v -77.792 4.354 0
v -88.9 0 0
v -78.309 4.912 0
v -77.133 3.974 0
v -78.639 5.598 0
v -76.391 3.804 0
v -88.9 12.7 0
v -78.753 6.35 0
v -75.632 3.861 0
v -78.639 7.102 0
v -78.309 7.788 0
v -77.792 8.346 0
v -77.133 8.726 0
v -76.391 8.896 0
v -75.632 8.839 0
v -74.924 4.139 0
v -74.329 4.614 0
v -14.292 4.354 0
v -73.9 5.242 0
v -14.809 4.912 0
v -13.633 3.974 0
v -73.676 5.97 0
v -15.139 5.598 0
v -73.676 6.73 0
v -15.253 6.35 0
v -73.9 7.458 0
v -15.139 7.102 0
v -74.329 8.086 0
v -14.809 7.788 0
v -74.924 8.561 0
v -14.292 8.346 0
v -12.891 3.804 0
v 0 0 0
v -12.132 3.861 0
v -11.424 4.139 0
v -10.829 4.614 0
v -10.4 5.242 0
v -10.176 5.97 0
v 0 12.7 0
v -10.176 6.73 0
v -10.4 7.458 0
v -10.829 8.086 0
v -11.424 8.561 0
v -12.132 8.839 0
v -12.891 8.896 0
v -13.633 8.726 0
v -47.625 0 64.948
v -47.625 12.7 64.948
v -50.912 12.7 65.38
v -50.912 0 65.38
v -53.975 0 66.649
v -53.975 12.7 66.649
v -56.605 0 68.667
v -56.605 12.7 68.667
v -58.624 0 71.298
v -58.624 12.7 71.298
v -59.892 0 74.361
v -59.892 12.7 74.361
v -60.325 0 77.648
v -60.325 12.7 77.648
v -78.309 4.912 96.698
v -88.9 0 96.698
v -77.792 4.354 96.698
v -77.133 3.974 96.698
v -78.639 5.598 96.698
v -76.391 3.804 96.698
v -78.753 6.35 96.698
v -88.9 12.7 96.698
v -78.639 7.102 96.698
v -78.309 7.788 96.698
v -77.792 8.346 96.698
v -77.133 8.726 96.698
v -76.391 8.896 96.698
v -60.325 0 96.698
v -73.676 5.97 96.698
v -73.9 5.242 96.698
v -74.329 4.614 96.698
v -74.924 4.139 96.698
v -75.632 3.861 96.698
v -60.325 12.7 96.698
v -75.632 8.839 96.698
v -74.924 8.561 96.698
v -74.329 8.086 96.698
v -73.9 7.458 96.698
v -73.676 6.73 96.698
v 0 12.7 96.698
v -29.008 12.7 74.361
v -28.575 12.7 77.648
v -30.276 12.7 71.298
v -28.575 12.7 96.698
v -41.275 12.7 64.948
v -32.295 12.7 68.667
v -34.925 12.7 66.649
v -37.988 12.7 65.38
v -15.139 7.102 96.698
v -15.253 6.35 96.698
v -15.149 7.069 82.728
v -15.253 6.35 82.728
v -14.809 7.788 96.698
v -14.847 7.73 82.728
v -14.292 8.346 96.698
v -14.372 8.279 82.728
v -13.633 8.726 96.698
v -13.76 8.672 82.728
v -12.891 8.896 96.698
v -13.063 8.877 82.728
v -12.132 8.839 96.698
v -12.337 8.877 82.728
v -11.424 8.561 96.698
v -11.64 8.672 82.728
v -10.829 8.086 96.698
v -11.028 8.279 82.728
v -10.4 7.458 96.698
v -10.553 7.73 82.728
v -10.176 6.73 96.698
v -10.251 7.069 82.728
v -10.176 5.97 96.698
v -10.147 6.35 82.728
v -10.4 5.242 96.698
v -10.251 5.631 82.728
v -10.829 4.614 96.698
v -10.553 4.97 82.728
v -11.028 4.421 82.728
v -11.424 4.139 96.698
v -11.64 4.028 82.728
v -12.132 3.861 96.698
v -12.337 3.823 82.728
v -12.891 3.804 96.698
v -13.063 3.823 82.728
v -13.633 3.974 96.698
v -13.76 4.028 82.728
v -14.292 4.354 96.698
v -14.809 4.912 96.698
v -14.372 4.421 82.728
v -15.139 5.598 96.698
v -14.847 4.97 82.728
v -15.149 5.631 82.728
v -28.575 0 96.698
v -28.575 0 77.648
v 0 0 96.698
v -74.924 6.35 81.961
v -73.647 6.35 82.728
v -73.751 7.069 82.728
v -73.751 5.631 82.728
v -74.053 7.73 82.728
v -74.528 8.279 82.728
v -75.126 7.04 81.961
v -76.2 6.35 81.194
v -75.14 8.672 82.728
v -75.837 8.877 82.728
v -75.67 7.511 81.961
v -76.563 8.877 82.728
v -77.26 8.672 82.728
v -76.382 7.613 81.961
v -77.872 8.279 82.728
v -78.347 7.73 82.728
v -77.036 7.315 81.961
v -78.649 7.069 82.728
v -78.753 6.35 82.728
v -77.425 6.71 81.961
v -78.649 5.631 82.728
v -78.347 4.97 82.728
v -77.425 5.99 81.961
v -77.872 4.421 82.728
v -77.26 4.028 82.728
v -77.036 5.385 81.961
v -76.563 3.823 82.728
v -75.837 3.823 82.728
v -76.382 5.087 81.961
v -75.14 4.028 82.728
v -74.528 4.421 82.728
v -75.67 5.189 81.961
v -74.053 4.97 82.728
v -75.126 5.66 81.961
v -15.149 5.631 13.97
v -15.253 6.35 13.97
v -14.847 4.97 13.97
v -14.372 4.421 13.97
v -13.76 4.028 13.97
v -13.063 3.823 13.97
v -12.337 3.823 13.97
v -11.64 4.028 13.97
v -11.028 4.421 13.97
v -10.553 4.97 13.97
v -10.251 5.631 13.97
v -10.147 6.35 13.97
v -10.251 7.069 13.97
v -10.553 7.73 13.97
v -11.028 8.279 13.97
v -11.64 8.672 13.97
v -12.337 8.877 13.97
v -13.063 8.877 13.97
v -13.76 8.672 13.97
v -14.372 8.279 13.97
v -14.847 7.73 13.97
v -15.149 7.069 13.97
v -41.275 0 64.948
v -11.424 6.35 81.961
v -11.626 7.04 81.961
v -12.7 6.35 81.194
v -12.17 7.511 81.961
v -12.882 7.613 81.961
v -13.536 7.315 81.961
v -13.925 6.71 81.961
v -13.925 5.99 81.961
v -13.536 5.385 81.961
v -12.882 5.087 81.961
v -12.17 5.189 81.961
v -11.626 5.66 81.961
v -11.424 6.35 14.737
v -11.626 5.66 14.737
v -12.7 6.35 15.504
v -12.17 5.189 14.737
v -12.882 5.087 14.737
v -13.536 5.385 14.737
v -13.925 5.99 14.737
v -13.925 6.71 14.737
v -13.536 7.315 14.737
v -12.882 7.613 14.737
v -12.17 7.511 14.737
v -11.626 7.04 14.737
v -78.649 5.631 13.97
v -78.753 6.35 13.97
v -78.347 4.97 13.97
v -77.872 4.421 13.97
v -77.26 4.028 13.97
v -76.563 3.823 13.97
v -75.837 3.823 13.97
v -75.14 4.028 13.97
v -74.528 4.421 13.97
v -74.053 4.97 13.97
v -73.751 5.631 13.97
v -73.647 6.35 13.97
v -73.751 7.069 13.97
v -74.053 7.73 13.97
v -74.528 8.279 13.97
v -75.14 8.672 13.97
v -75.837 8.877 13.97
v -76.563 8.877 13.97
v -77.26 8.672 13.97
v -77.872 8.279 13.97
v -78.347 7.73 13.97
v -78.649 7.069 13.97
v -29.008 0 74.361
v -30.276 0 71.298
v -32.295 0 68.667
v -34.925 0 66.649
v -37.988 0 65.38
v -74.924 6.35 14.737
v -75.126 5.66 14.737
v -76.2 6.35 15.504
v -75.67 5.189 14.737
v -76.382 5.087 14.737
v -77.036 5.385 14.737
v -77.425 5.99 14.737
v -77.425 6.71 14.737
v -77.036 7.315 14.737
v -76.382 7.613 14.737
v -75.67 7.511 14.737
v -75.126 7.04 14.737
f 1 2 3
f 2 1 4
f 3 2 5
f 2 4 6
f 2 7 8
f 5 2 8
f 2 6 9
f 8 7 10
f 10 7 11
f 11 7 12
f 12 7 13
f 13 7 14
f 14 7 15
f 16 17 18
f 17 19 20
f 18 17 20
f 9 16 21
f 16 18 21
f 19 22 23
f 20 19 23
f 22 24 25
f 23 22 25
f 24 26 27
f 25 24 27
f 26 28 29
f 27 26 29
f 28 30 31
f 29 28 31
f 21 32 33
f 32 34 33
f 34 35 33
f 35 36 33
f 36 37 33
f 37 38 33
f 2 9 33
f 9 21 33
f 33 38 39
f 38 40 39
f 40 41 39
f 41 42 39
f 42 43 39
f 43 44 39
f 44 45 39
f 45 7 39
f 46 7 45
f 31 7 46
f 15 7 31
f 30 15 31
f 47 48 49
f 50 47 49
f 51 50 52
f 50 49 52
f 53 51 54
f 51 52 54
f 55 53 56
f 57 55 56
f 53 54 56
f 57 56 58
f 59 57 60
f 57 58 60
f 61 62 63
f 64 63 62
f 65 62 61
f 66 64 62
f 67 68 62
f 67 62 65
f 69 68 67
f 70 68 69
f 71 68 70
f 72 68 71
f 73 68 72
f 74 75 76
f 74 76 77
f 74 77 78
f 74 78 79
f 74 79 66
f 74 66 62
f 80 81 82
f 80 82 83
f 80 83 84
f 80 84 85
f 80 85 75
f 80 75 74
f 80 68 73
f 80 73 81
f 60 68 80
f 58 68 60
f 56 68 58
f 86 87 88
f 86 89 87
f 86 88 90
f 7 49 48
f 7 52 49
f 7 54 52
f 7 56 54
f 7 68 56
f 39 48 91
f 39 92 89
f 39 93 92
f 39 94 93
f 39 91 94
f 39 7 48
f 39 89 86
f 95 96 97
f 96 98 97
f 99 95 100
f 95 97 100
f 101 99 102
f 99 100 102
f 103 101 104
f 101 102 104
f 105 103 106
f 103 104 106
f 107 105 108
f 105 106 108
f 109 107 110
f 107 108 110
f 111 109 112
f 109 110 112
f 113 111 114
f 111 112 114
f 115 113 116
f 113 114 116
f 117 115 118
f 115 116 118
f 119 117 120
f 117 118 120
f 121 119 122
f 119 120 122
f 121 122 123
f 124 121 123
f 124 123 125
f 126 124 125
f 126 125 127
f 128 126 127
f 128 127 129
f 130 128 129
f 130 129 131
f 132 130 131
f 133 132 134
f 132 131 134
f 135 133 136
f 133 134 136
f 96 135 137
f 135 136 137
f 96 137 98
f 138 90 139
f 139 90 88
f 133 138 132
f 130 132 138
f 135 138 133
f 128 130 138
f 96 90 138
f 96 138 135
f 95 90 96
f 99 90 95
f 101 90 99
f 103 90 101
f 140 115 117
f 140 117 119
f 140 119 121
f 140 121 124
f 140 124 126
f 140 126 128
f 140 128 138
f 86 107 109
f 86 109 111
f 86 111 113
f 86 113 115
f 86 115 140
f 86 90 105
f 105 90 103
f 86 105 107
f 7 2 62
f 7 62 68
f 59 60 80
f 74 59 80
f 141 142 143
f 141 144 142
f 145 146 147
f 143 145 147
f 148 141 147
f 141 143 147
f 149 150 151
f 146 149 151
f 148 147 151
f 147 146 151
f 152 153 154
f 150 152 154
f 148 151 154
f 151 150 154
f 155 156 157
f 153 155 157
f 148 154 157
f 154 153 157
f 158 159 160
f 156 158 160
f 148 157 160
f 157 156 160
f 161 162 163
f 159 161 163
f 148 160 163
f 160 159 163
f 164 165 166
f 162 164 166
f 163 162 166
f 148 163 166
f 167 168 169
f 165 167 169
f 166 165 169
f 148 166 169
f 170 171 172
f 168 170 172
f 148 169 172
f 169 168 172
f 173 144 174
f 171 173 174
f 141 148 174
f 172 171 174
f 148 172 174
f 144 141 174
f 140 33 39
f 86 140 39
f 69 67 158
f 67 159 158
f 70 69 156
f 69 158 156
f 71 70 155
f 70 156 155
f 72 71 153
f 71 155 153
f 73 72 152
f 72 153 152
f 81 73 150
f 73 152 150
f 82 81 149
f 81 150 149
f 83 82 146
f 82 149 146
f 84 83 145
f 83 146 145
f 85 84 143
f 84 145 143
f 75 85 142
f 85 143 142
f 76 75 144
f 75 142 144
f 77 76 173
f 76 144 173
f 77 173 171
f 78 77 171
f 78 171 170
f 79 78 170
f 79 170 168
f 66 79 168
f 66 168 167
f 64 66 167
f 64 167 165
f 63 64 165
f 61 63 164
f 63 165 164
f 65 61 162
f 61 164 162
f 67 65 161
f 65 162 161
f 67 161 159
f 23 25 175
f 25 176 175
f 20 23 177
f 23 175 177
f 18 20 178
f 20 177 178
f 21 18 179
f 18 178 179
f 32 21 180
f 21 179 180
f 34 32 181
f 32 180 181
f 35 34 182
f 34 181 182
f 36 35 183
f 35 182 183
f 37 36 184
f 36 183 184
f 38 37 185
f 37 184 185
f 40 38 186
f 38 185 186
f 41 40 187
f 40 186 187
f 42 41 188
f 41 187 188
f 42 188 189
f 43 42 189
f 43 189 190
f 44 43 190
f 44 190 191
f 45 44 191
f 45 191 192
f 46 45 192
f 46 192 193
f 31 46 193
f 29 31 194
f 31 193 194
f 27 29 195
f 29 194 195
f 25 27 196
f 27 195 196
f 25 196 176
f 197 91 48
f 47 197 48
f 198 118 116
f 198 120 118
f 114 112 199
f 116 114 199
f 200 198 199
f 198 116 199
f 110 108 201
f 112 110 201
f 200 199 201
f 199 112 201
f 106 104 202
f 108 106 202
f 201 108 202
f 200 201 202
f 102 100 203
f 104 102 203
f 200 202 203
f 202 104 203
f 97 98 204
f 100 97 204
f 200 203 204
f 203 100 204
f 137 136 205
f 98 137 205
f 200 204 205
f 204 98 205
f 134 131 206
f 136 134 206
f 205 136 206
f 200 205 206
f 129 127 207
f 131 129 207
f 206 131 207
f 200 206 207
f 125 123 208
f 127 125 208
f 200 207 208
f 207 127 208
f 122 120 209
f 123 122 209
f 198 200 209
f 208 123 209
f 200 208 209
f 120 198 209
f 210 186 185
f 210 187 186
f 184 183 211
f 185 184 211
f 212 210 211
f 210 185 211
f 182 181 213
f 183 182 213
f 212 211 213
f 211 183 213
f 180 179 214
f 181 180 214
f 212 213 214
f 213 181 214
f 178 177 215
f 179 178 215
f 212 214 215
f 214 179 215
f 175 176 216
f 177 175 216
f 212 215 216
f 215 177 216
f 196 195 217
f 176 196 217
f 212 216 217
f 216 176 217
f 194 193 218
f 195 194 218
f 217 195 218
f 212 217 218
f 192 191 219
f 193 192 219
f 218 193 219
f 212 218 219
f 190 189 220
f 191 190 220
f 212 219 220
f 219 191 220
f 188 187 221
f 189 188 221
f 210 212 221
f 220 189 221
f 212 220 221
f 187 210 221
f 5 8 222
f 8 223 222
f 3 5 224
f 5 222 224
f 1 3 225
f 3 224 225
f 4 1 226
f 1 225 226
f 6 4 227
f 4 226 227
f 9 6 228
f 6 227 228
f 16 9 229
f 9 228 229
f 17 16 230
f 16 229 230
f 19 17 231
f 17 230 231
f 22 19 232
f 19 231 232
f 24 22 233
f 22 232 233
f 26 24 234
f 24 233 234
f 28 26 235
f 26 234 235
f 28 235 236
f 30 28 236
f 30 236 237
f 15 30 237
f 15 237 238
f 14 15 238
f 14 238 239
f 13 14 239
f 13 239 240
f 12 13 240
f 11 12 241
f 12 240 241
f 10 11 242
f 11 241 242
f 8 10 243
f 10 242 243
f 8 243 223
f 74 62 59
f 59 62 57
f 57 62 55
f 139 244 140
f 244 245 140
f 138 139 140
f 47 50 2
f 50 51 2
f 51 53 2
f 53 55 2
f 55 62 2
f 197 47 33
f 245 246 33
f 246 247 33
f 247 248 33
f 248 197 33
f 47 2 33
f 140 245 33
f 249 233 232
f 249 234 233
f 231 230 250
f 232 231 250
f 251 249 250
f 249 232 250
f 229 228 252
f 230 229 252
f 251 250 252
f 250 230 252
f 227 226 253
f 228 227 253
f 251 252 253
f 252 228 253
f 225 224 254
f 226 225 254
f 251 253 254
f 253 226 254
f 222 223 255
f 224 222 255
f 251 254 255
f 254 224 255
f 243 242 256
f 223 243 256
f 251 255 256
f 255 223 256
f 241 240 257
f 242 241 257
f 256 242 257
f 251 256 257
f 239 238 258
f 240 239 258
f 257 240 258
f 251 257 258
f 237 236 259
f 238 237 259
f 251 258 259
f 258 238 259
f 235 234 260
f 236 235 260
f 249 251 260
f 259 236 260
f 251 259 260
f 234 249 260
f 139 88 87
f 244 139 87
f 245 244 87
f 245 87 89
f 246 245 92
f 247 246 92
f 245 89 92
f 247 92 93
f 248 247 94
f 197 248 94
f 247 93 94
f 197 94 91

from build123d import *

# Parameters (mm, degrees)
F0_W     = 88.9
F0_H     = 12.7
F1_DEPTH = 96.6975968
F3_D     = 5.1054
F3_DEPTH = 13.97
F3_TIP   = 1.5338169022
F5_D     = 5.1054
F5_DEPTH = 13.97
F5_TIP   = 1.5338169022
F7_DEPTH = 25.4


with BuildPart() as f1:
    # F0 (on Top) → F1 (new body)
    with BuildSketch(Plane.XY):
        with Locations((-44.45, 6.35)):
            Rectangle(F0_W, F0_H)
    extrude(amount=F1_DEPTH)

    # F3
    with Locations(Plane.XY.offset(96.6975968)):
        with Locations((-76.2, 6.35), (-12.7, 6.35)):
            Hole(F3_D / 2, depth=F3_DEPTH)
            with Locations((0, 0, -(F3_DEPTH + F3_TIP / 2))):  # 118° drill point
                Cone(0, F3_D / 2, F3_TIP, mode=Mode.SUBTRACT)

    # F5
    with Locations(Plane(origin=(0, 0, 0), x_dir=(1, 0, 0), z_dir=(0, 0, -1))):
        with Locations((-76.2, -6.35), (-12.7, -6.35)):
            Hole(F5_D / 2, depth=F5_DEPTH)
            with Locations((0, 0, -(F5_DEPTH + F5_TIP / 2))):  # 118° drill point
                Cone(0, F5_D / 2, F5_TIP, mode=Mode.SUBTRACT)

    # F6 (on face) → F7 (cut)
    with BuildSketch(Plane(origin=(0, 12.7, 0), x_dir=(-1, 0, 0), z_dir=(0, 1, 0))):
        with BuildLine():
            Line((60.325, 77.6475968), (60.325, 96.6975968))
            Line((60.325, 96.6975968), (28.575, 96.6975968))
            Line((28.575, 96.6975968), (28.575, 77.6475968))
            ThreePointArc((28.575, 77.6475968), (32.2947438789, 68.6673406789), (41.275, 64.9475968))
            Line((41.275, 64.9475968), (47.625, 64.9475968))
            ThreePointArc((47.625, 64.9475968), (56.6052561211, 68.6673406789), (60.325, 77.6475968))
        make_face()
    extrude(amount=-F7_DEPTH, mode=Mode.SUBTRACT)


solid = f1.part
